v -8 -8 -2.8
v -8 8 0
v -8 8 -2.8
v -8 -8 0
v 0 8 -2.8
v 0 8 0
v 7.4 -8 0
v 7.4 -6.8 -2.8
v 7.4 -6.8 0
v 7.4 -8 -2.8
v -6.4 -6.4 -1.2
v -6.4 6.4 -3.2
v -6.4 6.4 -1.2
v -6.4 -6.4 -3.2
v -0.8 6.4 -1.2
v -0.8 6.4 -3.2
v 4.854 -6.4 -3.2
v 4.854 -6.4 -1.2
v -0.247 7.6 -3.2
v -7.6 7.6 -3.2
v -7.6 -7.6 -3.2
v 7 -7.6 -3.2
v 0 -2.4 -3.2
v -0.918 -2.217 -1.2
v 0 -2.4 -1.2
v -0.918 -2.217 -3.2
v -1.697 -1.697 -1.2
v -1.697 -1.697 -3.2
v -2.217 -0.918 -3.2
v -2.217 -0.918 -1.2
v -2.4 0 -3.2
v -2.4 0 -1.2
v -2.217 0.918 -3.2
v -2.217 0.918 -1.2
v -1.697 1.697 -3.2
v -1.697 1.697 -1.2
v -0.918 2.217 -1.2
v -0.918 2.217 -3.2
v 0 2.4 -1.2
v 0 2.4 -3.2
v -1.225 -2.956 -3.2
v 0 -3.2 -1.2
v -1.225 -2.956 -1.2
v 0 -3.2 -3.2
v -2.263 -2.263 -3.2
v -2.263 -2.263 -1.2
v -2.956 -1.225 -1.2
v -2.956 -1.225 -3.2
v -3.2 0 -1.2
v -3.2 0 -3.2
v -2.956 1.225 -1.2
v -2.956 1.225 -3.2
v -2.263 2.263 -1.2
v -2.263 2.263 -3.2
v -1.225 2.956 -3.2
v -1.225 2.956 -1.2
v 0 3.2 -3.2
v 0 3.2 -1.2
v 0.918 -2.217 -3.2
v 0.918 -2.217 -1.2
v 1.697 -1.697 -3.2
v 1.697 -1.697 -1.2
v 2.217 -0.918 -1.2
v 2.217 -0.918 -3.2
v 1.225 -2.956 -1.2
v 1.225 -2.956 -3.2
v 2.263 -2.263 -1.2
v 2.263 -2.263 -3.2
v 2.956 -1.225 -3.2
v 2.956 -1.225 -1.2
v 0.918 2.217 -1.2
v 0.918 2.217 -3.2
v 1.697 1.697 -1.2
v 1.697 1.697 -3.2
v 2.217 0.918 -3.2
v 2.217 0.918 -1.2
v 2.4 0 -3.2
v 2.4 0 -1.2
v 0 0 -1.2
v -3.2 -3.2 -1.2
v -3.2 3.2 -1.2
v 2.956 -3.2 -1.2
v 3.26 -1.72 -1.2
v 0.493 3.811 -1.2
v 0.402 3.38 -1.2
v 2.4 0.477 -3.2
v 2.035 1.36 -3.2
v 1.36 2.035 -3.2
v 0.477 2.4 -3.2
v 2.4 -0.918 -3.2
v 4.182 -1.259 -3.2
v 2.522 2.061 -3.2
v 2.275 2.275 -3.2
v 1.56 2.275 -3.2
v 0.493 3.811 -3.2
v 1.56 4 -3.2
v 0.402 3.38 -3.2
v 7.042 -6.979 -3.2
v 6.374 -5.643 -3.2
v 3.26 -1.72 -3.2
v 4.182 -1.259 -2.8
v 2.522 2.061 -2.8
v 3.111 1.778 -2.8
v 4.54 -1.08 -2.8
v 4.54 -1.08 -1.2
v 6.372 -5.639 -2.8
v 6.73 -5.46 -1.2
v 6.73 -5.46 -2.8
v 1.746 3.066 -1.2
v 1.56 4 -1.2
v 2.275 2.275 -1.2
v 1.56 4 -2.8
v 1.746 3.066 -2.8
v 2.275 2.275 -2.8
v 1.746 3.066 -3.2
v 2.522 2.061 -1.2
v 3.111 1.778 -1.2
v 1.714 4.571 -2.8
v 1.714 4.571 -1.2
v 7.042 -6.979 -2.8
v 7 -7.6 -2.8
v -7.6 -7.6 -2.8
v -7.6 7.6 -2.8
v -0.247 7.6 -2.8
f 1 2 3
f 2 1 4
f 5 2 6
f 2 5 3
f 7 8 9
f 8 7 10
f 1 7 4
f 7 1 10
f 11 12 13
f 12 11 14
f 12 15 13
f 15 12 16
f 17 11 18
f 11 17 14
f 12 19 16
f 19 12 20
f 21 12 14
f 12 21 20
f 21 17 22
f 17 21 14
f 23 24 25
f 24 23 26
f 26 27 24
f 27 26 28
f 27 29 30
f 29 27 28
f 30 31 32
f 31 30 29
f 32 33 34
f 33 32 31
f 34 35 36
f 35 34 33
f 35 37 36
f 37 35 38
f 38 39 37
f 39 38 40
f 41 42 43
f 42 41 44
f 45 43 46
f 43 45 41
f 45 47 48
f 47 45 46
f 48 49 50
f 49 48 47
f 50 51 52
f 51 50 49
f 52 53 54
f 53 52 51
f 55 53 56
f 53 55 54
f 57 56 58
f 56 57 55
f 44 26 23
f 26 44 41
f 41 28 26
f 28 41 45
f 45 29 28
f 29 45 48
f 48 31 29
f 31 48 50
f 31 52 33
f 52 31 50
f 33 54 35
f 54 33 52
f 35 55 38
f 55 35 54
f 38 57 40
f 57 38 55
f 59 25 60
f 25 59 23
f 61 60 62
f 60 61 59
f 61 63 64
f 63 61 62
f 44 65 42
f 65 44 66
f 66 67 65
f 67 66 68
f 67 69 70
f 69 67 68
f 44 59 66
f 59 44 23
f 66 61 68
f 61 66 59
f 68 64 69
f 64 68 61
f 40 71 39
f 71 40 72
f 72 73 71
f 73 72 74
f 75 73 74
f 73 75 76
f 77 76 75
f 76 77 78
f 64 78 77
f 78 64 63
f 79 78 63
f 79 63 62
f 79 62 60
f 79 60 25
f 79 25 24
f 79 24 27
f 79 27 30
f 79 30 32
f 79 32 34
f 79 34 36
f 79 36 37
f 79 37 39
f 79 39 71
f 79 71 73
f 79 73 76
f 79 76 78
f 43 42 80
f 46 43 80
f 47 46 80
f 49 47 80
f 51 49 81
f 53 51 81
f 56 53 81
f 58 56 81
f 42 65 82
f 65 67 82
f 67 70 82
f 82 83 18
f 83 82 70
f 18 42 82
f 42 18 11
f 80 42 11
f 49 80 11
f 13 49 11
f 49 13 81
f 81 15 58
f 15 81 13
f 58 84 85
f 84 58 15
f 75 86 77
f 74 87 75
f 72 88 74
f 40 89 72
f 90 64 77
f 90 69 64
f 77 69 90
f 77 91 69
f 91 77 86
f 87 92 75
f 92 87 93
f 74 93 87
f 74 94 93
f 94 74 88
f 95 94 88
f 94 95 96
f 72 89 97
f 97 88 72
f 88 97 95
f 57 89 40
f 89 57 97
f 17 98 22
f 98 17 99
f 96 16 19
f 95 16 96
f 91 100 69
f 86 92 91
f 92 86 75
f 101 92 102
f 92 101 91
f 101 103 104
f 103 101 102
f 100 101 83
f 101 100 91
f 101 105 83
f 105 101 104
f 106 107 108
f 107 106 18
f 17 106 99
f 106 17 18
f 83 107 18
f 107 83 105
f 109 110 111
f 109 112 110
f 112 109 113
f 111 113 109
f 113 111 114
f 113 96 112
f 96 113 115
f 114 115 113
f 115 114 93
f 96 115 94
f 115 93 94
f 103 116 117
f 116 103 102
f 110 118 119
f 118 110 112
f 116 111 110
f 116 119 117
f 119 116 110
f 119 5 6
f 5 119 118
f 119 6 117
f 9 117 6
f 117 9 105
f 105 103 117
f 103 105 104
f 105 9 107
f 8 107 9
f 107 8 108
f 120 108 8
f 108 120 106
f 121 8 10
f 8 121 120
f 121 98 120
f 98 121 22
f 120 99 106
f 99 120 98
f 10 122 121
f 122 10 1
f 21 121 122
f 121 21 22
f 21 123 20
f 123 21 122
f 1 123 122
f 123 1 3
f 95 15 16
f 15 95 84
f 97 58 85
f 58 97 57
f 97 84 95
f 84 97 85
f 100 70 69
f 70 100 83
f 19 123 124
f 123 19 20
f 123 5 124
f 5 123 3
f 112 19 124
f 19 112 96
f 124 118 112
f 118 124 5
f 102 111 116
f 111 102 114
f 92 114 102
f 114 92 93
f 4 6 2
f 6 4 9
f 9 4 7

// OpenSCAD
use <../lib.scad>
use <s/7828s01.scad>
function ldraw_lib__7829() = [
// 0 Tile  2 x  2 Cut Right
// 0 Name: 7829.dat
// 0 Author: Magnus Forsberg [MagFors]
// 0 !LDRAW_ORG Part UPDATE 2026-03
// 0 !LICENSE Licensed under CC BY 4.0 : see CAreadme.txt
// 
// 0 BFC CERTIFY CCW
  [0,"BFC","CERTIFY"],
  [0,"BFC","CCW"],
// 
// 0 !KEYWORDS Brickowl 218259
// 
// 0 !HISTORY 2026-01-01 {LEGO Instructions App} Original part shape
// 0 !HISTORY 2026-01-01 [MagFors] File preparation for LDraw Parts Tracker
// 0 !HISTORY 2026-03-31 [OrionP] Official Update 2026-03
// 
// 1 16 0 0 0 1 0 0 0 1 0 0 0 -1 s\7828s01.dat
  [1,16,0,0,0,1,0,0,0,1,0,0,0,-1, ldraw_lib__s__7828s01()],
// 0 // top surface
// 4 16 -20 0 20 -20 0 -20 18.5 0 -17 0 0 20
  [4,16,-20,0,20,-20,0,-20,18.5,0,-17,0,0,20],
// 3 16 18.5 0 -17 -20 0 -20 18.5 0 -20
  [3,16,18.5,0,-17,-20,0,-20,18.5,0,-20],
];
module ldraw_lib__7829(step=0, col=false, unit=2/5, alt=false, line=0.2, solid=!$preview)
    makepoly(ldraw_lib__7829(), step=step, col=col, unit=unit, alt=alt, line=line, solid=solid);
ldraw_lib__7829(line=0.2);
